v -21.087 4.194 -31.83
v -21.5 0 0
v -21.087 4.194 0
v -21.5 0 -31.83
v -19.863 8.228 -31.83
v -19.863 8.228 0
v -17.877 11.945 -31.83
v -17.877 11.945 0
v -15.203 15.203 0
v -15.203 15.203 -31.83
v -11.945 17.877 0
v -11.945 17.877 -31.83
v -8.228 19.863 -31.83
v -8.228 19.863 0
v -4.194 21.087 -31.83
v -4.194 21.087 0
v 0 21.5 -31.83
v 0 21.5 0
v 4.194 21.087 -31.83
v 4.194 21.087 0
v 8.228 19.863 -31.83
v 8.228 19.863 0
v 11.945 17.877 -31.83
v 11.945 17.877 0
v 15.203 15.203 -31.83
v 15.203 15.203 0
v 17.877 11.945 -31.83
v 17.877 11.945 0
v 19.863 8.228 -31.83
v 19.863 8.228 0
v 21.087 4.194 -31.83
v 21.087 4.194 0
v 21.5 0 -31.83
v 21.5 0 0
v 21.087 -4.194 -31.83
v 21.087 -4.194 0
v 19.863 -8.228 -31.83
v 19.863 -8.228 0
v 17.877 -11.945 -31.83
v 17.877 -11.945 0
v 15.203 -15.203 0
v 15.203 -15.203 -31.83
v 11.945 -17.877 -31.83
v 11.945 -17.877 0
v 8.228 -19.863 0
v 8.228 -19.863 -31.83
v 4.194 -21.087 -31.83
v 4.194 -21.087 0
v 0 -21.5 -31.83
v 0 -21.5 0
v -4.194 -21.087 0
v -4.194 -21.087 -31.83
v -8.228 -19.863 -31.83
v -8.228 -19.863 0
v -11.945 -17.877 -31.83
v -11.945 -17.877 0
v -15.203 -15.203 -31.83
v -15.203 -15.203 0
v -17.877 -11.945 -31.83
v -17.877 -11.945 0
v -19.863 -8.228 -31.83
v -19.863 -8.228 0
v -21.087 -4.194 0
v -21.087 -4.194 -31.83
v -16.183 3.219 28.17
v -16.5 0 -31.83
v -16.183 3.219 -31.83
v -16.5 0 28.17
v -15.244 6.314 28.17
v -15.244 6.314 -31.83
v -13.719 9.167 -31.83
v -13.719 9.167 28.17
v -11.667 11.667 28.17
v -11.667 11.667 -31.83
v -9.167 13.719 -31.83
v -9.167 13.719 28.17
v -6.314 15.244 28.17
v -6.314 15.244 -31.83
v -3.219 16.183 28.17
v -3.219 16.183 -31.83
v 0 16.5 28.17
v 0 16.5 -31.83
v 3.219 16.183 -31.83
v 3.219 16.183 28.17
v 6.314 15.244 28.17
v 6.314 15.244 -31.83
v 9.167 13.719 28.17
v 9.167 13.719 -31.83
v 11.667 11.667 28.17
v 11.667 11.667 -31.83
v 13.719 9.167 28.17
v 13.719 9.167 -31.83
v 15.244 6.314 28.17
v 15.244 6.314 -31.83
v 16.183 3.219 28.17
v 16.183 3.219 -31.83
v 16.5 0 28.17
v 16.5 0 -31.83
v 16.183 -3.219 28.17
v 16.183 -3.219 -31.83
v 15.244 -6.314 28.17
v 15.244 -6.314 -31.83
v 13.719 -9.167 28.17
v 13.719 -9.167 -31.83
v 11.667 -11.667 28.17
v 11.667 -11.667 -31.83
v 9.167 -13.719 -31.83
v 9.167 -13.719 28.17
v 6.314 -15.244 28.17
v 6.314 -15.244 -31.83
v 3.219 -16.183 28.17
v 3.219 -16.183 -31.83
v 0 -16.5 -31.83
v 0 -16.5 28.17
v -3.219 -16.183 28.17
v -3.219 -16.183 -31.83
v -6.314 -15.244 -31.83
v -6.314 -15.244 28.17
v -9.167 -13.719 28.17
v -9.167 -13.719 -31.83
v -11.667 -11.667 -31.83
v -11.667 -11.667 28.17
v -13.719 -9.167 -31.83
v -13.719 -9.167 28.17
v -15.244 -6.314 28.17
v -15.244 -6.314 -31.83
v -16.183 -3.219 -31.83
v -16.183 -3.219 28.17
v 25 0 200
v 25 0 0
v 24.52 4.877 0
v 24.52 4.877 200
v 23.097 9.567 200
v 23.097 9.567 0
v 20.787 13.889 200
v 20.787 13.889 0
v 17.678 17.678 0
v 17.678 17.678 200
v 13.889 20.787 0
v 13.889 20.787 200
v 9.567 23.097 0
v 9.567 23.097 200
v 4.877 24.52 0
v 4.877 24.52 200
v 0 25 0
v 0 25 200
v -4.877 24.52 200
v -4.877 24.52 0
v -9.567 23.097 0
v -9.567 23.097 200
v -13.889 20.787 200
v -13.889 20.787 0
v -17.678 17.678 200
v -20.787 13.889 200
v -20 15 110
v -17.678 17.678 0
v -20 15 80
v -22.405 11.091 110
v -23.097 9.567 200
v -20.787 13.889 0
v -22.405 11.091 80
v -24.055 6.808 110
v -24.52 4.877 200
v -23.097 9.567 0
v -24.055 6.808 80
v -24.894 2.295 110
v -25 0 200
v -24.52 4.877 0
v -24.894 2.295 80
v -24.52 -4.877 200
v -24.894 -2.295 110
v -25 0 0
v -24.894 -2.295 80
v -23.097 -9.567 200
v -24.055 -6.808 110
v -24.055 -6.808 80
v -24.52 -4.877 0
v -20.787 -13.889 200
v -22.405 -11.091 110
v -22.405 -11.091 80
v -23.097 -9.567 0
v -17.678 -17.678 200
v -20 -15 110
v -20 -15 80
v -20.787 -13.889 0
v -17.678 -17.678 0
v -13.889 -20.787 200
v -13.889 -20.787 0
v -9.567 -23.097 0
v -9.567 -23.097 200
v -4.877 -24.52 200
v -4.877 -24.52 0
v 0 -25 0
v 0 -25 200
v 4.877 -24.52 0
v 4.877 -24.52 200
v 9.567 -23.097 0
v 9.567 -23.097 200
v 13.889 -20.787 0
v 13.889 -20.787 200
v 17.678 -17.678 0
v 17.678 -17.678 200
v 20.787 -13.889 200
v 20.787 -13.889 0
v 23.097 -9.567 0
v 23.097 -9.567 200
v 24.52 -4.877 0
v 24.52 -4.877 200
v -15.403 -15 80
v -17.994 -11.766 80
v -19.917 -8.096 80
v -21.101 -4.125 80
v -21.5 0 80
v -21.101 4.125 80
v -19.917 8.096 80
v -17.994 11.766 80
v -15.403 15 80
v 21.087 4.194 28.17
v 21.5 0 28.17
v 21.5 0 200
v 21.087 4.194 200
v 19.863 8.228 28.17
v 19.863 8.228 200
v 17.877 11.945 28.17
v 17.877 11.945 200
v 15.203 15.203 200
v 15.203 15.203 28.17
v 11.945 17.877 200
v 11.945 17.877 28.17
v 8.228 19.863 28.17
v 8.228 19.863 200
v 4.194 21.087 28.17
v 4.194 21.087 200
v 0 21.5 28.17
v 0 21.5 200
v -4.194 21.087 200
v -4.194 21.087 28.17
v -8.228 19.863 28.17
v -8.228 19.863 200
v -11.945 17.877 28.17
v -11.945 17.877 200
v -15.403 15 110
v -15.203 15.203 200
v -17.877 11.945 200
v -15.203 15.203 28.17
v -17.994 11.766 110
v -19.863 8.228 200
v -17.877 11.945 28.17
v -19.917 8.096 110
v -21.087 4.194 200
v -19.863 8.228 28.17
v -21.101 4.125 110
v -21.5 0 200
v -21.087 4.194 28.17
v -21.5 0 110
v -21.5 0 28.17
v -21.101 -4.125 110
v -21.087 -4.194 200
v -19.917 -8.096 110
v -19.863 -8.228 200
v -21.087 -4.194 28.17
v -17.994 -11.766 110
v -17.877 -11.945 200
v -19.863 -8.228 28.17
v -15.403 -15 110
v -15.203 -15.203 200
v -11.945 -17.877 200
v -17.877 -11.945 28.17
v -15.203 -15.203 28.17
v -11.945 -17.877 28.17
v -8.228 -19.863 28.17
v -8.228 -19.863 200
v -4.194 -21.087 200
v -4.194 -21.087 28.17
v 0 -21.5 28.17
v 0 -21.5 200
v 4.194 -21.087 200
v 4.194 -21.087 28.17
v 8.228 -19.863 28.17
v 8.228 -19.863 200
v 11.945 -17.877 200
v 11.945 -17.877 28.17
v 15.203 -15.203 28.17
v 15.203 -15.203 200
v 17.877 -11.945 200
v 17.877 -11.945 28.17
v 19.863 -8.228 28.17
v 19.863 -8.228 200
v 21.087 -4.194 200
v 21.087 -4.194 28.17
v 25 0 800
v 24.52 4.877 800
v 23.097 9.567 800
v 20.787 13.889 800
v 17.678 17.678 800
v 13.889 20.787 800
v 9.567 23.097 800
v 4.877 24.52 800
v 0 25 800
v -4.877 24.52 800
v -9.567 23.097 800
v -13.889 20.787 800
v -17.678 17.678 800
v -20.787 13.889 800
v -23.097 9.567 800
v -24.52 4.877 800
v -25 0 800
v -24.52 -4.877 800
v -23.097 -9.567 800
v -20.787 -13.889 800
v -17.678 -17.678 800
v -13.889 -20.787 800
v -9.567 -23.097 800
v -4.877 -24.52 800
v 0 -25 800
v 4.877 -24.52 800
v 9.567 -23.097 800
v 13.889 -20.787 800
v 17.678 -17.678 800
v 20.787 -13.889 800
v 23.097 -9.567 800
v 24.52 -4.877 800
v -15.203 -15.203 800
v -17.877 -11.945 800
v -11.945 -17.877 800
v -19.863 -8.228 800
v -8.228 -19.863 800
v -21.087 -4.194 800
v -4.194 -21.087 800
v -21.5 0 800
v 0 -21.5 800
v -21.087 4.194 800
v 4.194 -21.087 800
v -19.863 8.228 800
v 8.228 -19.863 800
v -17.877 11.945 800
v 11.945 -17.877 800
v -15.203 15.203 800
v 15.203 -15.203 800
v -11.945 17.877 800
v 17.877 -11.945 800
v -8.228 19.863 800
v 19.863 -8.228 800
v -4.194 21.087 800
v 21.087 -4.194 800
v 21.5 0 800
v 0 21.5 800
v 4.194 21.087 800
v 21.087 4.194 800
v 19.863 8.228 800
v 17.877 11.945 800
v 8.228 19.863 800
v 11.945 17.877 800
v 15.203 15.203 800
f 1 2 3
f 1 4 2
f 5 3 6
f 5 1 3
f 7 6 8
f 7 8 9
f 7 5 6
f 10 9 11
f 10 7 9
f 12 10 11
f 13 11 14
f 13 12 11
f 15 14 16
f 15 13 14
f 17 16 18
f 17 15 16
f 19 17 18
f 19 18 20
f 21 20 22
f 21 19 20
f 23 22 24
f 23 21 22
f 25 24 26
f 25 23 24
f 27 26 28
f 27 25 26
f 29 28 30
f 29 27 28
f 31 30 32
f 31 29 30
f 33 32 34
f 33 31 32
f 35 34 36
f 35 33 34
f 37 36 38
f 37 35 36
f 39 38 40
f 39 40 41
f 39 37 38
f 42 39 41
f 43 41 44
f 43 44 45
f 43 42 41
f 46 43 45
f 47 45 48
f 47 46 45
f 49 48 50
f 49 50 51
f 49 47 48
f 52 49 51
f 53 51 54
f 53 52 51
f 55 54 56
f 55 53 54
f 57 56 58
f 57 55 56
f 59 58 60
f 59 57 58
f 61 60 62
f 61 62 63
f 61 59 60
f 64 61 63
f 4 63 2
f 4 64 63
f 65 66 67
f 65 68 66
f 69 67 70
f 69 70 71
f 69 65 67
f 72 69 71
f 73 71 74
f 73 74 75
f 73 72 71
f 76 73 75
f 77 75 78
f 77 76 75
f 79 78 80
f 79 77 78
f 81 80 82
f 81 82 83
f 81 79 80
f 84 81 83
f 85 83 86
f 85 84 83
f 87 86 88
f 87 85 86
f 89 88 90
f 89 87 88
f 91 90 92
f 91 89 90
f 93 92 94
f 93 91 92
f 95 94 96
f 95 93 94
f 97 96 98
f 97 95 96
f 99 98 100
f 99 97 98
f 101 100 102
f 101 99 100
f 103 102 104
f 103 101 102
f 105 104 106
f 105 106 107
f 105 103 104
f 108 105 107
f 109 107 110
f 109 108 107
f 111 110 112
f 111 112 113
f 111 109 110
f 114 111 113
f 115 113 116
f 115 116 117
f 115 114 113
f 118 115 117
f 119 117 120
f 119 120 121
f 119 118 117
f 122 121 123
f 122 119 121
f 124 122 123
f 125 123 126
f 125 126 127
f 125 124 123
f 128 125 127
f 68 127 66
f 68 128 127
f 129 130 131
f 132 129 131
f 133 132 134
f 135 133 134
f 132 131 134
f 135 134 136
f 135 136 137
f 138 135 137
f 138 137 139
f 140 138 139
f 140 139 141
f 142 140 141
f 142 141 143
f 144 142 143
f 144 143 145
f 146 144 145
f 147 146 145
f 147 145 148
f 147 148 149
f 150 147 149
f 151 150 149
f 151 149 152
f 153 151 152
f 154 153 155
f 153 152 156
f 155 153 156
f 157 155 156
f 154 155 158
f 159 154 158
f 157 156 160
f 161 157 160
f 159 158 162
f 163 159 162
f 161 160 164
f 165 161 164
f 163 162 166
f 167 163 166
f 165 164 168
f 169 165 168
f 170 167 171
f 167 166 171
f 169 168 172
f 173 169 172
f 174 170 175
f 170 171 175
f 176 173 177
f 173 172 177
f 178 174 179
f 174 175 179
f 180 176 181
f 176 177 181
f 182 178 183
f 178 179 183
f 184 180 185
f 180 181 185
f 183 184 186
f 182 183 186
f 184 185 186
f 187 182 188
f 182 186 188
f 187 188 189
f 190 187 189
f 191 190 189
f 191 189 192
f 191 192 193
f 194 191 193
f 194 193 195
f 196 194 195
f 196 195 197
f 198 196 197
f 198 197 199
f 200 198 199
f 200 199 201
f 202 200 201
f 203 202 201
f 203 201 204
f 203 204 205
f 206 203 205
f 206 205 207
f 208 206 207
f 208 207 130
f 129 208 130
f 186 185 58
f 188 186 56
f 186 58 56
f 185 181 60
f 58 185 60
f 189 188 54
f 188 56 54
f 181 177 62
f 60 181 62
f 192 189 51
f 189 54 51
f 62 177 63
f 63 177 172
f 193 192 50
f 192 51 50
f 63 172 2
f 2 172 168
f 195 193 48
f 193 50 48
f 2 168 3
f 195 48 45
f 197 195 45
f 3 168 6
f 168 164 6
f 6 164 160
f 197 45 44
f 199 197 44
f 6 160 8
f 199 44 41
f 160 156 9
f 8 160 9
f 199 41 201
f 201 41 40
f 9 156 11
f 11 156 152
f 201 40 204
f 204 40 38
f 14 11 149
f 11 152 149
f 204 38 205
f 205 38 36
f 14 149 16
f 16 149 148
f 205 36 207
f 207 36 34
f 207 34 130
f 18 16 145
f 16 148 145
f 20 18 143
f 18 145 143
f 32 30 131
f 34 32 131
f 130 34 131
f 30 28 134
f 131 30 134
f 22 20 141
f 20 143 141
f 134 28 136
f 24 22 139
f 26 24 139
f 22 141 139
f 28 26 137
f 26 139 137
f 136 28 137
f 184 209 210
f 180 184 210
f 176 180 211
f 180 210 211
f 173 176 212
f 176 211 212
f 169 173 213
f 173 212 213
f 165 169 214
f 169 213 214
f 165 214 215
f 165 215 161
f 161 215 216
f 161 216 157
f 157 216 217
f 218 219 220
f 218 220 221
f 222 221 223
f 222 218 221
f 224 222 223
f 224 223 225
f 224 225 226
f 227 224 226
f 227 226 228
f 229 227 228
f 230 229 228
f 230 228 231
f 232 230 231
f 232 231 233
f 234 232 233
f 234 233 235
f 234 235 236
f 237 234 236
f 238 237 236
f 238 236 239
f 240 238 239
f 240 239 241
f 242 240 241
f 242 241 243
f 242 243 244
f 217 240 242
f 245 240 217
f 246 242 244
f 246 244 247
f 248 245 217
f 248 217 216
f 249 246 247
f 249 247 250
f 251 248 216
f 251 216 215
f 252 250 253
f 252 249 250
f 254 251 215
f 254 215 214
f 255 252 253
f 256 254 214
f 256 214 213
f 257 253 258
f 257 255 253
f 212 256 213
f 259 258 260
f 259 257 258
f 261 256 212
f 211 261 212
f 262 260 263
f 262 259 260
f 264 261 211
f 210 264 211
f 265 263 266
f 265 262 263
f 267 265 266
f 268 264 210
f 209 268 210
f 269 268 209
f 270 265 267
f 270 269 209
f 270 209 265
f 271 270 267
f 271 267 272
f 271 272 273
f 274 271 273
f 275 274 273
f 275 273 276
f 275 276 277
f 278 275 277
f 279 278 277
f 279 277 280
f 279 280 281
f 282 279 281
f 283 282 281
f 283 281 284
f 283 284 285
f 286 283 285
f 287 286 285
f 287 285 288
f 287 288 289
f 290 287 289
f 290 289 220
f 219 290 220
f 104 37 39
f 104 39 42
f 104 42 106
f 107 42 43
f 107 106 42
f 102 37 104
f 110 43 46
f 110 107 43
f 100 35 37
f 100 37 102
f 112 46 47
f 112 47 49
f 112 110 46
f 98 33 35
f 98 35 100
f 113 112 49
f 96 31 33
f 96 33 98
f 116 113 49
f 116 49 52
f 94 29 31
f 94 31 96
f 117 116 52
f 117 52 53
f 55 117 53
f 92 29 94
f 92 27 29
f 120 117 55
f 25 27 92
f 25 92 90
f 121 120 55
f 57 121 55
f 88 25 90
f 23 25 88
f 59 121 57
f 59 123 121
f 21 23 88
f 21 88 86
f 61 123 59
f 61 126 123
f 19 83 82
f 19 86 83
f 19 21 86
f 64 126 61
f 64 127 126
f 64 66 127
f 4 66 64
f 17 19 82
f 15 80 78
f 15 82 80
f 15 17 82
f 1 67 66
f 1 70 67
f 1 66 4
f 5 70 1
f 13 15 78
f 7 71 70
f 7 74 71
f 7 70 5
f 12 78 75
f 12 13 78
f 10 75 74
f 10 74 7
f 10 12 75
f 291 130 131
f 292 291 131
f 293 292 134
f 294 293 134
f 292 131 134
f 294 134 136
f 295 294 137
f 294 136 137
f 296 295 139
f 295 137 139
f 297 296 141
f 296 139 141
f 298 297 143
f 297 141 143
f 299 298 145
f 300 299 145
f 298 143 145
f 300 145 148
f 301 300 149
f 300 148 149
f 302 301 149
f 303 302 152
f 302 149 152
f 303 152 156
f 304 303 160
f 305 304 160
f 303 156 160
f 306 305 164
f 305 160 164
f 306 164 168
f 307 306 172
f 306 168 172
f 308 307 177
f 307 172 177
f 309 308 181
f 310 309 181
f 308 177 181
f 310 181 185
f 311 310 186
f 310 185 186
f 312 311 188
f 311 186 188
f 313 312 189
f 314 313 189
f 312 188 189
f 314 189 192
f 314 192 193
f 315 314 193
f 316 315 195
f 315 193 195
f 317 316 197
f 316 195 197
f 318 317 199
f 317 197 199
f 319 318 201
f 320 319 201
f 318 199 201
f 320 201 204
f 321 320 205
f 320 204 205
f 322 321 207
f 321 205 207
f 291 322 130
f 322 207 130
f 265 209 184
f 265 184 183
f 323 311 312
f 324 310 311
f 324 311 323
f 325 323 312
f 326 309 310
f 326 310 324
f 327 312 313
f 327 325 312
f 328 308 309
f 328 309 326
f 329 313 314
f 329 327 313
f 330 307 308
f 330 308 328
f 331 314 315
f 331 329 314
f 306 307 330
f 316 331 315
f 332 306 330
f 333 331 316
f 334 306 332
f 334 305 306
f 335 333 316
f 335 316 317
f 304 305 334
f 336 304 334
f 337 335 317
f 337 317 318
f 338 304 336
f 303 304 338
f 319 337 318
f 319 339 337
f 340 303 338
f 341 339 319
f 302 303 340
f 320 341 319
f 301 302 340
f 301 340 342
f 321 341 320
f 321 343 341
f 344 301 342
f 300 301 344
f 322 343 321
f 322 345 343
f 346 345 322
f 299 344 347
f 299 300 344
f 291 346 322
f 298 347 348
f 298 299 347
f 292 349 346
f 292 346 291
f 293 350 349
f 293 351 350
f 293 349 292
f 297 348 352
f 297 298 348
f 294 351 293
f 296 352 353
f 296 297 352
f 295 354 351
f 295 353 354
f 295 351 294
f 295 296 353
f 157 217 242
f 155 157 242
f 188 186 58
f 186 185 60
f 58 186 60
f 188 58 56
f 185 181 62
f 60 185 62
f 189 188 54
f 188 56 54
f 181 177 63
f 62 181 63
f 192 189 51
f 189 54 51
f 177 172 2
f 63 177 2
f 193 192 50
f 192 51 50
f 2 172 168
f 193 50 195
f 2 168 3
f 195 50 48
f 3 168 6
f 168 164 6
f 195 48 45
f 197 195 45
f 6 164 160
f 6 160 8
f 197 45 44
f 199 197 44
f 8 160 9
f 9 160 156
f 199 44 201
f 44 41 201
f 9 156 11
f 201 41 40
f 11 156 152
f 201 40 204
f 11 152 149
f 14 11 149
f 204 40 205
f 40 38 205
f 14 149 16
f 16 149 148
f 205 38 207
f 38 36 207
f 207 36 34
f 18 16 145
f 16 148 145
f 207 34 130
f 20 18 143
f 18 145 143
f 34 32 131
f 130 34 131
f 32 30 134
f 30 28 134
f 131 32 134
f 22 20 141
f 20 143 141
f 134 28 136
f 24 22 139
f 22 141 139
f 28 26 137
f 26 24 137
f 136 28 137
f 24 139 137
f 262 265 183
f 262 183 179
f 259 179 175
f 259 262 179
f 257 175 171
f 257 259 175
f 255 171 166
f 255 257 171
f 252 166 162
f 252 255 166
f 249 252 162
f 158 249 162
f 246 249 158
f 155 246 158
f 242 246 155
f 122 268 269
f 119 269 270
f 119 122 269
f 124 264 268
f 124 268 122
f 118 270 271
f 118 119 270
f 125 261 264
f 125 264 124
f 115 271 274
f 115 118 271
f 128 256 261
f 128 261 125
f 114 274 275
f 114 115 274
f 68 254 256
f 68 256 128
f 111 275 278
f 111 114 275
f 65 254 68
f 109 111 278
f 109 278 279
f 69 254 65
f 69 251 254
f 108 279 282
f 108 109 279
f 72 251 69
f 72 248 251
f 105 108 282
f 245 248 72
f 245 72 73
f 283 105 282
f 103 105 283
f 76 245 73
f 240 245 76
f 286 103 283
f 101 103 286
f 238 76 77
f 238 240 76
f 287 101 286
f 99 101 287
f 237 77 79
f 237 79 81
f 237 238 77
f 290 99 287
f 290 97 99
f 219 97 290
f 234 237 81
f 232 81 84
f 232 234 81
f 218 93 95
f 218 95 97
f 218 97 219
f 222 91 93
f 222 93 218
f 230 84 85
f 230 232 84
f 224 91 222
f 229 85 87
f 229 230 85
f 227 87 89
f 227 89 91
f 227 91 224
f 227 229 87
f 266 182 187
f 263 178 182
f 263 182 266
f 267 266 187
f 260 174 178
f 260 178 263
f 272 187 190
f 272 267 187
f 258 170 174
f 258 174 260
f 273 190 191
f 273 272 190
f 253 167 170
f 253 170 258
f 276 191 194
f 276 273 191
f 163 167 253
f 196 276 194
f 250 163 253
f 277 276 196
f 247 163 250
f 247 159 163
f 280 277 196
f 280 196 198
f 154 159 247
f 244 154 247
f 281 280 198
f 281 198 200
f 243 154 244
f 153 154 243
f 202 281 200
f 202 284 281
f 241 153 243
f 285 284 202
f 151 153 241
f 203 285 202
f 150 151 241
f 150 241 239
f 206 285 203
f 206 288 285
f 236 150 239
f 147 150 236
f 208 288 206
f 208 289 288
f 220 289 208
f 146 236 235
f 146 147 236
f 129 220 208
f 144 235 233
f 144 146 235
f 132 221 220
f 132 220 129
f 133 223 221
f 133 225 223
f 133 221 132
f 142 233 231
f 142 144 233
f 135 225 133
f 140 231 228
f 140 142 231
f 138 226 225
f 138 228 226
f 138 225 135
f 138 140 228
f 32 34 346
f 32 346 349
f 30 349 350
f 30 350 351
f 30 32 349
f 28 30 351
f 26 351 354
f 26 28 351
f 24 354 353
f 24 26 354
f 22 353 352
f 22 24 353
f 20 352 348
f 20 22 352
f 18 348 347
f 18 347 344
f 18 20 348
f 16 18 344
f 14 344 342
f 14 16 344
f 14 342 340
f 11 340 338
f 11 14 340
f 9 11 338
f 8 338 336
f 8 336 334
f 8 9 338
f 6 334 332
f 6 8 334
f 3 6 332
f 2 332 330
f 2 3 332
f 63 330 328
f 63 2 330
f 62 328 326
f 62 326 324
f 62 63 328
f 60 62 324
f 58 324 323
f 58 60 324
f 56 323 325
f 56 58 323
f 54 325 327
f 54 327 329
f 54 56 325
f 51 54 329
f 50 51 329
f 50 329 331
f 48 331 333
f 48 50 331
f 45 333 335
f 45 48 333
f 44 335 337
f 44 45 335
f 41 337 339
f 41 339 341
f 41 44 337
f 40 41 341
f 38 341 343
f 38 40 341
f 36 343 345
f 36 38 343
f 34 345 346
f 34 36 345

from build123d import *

# Parameters (mm, degrees)
F0_R     = 25
F0_R_2   = 21.5
F1_DEPTH = 800
F2_DEPTH = 200
F3_W     = 30
F3_H     = 30
F4_DEPTH = 25.001


with BuildPart() as f1:
    # F0 (on Top) → F1 (new body)
    with BuildSketch(Plane.XY):
        Circle(F0_R)
        Circle(F0_R_2, mode=Mode.SUBTRACT)
    extrude(amount=F1_DEPTH)


with BuildPart() as f2:
    # F0 (on Top) → F2 (new body)
    with BuildSketch(Plane.XY):
        Circle(F0_R)
        Circle(F0_R_2, mode=Mode.SUBTRACT)
    extrude(amount=F2_DEPTH)

    # F3 (on Right) → F4 (cut, through all)
    with BuildSketch(Plane.YZ):
        with Locations((0, 95)):
            Rectangle(F3_W, F3_H)
    extrude(amount=-F4_DEPTH, mode=Mode.SUBTRACT)

    # F5 (on Front) → F6 (revolve)
    with BuildSketch(Plane.XZ):
        Polygon((-16.5, -31.8300328033), (-16.5, 0), (-16.5, 28.1699671967), (-21.5, 28.1699671967), (-21.5, -31.8300328033), align=None)
    revolve(axis=Axis((0, 0, -0.3124903888), (0, 0, -1)))


solid = Compound([f1.part, f2.part])
